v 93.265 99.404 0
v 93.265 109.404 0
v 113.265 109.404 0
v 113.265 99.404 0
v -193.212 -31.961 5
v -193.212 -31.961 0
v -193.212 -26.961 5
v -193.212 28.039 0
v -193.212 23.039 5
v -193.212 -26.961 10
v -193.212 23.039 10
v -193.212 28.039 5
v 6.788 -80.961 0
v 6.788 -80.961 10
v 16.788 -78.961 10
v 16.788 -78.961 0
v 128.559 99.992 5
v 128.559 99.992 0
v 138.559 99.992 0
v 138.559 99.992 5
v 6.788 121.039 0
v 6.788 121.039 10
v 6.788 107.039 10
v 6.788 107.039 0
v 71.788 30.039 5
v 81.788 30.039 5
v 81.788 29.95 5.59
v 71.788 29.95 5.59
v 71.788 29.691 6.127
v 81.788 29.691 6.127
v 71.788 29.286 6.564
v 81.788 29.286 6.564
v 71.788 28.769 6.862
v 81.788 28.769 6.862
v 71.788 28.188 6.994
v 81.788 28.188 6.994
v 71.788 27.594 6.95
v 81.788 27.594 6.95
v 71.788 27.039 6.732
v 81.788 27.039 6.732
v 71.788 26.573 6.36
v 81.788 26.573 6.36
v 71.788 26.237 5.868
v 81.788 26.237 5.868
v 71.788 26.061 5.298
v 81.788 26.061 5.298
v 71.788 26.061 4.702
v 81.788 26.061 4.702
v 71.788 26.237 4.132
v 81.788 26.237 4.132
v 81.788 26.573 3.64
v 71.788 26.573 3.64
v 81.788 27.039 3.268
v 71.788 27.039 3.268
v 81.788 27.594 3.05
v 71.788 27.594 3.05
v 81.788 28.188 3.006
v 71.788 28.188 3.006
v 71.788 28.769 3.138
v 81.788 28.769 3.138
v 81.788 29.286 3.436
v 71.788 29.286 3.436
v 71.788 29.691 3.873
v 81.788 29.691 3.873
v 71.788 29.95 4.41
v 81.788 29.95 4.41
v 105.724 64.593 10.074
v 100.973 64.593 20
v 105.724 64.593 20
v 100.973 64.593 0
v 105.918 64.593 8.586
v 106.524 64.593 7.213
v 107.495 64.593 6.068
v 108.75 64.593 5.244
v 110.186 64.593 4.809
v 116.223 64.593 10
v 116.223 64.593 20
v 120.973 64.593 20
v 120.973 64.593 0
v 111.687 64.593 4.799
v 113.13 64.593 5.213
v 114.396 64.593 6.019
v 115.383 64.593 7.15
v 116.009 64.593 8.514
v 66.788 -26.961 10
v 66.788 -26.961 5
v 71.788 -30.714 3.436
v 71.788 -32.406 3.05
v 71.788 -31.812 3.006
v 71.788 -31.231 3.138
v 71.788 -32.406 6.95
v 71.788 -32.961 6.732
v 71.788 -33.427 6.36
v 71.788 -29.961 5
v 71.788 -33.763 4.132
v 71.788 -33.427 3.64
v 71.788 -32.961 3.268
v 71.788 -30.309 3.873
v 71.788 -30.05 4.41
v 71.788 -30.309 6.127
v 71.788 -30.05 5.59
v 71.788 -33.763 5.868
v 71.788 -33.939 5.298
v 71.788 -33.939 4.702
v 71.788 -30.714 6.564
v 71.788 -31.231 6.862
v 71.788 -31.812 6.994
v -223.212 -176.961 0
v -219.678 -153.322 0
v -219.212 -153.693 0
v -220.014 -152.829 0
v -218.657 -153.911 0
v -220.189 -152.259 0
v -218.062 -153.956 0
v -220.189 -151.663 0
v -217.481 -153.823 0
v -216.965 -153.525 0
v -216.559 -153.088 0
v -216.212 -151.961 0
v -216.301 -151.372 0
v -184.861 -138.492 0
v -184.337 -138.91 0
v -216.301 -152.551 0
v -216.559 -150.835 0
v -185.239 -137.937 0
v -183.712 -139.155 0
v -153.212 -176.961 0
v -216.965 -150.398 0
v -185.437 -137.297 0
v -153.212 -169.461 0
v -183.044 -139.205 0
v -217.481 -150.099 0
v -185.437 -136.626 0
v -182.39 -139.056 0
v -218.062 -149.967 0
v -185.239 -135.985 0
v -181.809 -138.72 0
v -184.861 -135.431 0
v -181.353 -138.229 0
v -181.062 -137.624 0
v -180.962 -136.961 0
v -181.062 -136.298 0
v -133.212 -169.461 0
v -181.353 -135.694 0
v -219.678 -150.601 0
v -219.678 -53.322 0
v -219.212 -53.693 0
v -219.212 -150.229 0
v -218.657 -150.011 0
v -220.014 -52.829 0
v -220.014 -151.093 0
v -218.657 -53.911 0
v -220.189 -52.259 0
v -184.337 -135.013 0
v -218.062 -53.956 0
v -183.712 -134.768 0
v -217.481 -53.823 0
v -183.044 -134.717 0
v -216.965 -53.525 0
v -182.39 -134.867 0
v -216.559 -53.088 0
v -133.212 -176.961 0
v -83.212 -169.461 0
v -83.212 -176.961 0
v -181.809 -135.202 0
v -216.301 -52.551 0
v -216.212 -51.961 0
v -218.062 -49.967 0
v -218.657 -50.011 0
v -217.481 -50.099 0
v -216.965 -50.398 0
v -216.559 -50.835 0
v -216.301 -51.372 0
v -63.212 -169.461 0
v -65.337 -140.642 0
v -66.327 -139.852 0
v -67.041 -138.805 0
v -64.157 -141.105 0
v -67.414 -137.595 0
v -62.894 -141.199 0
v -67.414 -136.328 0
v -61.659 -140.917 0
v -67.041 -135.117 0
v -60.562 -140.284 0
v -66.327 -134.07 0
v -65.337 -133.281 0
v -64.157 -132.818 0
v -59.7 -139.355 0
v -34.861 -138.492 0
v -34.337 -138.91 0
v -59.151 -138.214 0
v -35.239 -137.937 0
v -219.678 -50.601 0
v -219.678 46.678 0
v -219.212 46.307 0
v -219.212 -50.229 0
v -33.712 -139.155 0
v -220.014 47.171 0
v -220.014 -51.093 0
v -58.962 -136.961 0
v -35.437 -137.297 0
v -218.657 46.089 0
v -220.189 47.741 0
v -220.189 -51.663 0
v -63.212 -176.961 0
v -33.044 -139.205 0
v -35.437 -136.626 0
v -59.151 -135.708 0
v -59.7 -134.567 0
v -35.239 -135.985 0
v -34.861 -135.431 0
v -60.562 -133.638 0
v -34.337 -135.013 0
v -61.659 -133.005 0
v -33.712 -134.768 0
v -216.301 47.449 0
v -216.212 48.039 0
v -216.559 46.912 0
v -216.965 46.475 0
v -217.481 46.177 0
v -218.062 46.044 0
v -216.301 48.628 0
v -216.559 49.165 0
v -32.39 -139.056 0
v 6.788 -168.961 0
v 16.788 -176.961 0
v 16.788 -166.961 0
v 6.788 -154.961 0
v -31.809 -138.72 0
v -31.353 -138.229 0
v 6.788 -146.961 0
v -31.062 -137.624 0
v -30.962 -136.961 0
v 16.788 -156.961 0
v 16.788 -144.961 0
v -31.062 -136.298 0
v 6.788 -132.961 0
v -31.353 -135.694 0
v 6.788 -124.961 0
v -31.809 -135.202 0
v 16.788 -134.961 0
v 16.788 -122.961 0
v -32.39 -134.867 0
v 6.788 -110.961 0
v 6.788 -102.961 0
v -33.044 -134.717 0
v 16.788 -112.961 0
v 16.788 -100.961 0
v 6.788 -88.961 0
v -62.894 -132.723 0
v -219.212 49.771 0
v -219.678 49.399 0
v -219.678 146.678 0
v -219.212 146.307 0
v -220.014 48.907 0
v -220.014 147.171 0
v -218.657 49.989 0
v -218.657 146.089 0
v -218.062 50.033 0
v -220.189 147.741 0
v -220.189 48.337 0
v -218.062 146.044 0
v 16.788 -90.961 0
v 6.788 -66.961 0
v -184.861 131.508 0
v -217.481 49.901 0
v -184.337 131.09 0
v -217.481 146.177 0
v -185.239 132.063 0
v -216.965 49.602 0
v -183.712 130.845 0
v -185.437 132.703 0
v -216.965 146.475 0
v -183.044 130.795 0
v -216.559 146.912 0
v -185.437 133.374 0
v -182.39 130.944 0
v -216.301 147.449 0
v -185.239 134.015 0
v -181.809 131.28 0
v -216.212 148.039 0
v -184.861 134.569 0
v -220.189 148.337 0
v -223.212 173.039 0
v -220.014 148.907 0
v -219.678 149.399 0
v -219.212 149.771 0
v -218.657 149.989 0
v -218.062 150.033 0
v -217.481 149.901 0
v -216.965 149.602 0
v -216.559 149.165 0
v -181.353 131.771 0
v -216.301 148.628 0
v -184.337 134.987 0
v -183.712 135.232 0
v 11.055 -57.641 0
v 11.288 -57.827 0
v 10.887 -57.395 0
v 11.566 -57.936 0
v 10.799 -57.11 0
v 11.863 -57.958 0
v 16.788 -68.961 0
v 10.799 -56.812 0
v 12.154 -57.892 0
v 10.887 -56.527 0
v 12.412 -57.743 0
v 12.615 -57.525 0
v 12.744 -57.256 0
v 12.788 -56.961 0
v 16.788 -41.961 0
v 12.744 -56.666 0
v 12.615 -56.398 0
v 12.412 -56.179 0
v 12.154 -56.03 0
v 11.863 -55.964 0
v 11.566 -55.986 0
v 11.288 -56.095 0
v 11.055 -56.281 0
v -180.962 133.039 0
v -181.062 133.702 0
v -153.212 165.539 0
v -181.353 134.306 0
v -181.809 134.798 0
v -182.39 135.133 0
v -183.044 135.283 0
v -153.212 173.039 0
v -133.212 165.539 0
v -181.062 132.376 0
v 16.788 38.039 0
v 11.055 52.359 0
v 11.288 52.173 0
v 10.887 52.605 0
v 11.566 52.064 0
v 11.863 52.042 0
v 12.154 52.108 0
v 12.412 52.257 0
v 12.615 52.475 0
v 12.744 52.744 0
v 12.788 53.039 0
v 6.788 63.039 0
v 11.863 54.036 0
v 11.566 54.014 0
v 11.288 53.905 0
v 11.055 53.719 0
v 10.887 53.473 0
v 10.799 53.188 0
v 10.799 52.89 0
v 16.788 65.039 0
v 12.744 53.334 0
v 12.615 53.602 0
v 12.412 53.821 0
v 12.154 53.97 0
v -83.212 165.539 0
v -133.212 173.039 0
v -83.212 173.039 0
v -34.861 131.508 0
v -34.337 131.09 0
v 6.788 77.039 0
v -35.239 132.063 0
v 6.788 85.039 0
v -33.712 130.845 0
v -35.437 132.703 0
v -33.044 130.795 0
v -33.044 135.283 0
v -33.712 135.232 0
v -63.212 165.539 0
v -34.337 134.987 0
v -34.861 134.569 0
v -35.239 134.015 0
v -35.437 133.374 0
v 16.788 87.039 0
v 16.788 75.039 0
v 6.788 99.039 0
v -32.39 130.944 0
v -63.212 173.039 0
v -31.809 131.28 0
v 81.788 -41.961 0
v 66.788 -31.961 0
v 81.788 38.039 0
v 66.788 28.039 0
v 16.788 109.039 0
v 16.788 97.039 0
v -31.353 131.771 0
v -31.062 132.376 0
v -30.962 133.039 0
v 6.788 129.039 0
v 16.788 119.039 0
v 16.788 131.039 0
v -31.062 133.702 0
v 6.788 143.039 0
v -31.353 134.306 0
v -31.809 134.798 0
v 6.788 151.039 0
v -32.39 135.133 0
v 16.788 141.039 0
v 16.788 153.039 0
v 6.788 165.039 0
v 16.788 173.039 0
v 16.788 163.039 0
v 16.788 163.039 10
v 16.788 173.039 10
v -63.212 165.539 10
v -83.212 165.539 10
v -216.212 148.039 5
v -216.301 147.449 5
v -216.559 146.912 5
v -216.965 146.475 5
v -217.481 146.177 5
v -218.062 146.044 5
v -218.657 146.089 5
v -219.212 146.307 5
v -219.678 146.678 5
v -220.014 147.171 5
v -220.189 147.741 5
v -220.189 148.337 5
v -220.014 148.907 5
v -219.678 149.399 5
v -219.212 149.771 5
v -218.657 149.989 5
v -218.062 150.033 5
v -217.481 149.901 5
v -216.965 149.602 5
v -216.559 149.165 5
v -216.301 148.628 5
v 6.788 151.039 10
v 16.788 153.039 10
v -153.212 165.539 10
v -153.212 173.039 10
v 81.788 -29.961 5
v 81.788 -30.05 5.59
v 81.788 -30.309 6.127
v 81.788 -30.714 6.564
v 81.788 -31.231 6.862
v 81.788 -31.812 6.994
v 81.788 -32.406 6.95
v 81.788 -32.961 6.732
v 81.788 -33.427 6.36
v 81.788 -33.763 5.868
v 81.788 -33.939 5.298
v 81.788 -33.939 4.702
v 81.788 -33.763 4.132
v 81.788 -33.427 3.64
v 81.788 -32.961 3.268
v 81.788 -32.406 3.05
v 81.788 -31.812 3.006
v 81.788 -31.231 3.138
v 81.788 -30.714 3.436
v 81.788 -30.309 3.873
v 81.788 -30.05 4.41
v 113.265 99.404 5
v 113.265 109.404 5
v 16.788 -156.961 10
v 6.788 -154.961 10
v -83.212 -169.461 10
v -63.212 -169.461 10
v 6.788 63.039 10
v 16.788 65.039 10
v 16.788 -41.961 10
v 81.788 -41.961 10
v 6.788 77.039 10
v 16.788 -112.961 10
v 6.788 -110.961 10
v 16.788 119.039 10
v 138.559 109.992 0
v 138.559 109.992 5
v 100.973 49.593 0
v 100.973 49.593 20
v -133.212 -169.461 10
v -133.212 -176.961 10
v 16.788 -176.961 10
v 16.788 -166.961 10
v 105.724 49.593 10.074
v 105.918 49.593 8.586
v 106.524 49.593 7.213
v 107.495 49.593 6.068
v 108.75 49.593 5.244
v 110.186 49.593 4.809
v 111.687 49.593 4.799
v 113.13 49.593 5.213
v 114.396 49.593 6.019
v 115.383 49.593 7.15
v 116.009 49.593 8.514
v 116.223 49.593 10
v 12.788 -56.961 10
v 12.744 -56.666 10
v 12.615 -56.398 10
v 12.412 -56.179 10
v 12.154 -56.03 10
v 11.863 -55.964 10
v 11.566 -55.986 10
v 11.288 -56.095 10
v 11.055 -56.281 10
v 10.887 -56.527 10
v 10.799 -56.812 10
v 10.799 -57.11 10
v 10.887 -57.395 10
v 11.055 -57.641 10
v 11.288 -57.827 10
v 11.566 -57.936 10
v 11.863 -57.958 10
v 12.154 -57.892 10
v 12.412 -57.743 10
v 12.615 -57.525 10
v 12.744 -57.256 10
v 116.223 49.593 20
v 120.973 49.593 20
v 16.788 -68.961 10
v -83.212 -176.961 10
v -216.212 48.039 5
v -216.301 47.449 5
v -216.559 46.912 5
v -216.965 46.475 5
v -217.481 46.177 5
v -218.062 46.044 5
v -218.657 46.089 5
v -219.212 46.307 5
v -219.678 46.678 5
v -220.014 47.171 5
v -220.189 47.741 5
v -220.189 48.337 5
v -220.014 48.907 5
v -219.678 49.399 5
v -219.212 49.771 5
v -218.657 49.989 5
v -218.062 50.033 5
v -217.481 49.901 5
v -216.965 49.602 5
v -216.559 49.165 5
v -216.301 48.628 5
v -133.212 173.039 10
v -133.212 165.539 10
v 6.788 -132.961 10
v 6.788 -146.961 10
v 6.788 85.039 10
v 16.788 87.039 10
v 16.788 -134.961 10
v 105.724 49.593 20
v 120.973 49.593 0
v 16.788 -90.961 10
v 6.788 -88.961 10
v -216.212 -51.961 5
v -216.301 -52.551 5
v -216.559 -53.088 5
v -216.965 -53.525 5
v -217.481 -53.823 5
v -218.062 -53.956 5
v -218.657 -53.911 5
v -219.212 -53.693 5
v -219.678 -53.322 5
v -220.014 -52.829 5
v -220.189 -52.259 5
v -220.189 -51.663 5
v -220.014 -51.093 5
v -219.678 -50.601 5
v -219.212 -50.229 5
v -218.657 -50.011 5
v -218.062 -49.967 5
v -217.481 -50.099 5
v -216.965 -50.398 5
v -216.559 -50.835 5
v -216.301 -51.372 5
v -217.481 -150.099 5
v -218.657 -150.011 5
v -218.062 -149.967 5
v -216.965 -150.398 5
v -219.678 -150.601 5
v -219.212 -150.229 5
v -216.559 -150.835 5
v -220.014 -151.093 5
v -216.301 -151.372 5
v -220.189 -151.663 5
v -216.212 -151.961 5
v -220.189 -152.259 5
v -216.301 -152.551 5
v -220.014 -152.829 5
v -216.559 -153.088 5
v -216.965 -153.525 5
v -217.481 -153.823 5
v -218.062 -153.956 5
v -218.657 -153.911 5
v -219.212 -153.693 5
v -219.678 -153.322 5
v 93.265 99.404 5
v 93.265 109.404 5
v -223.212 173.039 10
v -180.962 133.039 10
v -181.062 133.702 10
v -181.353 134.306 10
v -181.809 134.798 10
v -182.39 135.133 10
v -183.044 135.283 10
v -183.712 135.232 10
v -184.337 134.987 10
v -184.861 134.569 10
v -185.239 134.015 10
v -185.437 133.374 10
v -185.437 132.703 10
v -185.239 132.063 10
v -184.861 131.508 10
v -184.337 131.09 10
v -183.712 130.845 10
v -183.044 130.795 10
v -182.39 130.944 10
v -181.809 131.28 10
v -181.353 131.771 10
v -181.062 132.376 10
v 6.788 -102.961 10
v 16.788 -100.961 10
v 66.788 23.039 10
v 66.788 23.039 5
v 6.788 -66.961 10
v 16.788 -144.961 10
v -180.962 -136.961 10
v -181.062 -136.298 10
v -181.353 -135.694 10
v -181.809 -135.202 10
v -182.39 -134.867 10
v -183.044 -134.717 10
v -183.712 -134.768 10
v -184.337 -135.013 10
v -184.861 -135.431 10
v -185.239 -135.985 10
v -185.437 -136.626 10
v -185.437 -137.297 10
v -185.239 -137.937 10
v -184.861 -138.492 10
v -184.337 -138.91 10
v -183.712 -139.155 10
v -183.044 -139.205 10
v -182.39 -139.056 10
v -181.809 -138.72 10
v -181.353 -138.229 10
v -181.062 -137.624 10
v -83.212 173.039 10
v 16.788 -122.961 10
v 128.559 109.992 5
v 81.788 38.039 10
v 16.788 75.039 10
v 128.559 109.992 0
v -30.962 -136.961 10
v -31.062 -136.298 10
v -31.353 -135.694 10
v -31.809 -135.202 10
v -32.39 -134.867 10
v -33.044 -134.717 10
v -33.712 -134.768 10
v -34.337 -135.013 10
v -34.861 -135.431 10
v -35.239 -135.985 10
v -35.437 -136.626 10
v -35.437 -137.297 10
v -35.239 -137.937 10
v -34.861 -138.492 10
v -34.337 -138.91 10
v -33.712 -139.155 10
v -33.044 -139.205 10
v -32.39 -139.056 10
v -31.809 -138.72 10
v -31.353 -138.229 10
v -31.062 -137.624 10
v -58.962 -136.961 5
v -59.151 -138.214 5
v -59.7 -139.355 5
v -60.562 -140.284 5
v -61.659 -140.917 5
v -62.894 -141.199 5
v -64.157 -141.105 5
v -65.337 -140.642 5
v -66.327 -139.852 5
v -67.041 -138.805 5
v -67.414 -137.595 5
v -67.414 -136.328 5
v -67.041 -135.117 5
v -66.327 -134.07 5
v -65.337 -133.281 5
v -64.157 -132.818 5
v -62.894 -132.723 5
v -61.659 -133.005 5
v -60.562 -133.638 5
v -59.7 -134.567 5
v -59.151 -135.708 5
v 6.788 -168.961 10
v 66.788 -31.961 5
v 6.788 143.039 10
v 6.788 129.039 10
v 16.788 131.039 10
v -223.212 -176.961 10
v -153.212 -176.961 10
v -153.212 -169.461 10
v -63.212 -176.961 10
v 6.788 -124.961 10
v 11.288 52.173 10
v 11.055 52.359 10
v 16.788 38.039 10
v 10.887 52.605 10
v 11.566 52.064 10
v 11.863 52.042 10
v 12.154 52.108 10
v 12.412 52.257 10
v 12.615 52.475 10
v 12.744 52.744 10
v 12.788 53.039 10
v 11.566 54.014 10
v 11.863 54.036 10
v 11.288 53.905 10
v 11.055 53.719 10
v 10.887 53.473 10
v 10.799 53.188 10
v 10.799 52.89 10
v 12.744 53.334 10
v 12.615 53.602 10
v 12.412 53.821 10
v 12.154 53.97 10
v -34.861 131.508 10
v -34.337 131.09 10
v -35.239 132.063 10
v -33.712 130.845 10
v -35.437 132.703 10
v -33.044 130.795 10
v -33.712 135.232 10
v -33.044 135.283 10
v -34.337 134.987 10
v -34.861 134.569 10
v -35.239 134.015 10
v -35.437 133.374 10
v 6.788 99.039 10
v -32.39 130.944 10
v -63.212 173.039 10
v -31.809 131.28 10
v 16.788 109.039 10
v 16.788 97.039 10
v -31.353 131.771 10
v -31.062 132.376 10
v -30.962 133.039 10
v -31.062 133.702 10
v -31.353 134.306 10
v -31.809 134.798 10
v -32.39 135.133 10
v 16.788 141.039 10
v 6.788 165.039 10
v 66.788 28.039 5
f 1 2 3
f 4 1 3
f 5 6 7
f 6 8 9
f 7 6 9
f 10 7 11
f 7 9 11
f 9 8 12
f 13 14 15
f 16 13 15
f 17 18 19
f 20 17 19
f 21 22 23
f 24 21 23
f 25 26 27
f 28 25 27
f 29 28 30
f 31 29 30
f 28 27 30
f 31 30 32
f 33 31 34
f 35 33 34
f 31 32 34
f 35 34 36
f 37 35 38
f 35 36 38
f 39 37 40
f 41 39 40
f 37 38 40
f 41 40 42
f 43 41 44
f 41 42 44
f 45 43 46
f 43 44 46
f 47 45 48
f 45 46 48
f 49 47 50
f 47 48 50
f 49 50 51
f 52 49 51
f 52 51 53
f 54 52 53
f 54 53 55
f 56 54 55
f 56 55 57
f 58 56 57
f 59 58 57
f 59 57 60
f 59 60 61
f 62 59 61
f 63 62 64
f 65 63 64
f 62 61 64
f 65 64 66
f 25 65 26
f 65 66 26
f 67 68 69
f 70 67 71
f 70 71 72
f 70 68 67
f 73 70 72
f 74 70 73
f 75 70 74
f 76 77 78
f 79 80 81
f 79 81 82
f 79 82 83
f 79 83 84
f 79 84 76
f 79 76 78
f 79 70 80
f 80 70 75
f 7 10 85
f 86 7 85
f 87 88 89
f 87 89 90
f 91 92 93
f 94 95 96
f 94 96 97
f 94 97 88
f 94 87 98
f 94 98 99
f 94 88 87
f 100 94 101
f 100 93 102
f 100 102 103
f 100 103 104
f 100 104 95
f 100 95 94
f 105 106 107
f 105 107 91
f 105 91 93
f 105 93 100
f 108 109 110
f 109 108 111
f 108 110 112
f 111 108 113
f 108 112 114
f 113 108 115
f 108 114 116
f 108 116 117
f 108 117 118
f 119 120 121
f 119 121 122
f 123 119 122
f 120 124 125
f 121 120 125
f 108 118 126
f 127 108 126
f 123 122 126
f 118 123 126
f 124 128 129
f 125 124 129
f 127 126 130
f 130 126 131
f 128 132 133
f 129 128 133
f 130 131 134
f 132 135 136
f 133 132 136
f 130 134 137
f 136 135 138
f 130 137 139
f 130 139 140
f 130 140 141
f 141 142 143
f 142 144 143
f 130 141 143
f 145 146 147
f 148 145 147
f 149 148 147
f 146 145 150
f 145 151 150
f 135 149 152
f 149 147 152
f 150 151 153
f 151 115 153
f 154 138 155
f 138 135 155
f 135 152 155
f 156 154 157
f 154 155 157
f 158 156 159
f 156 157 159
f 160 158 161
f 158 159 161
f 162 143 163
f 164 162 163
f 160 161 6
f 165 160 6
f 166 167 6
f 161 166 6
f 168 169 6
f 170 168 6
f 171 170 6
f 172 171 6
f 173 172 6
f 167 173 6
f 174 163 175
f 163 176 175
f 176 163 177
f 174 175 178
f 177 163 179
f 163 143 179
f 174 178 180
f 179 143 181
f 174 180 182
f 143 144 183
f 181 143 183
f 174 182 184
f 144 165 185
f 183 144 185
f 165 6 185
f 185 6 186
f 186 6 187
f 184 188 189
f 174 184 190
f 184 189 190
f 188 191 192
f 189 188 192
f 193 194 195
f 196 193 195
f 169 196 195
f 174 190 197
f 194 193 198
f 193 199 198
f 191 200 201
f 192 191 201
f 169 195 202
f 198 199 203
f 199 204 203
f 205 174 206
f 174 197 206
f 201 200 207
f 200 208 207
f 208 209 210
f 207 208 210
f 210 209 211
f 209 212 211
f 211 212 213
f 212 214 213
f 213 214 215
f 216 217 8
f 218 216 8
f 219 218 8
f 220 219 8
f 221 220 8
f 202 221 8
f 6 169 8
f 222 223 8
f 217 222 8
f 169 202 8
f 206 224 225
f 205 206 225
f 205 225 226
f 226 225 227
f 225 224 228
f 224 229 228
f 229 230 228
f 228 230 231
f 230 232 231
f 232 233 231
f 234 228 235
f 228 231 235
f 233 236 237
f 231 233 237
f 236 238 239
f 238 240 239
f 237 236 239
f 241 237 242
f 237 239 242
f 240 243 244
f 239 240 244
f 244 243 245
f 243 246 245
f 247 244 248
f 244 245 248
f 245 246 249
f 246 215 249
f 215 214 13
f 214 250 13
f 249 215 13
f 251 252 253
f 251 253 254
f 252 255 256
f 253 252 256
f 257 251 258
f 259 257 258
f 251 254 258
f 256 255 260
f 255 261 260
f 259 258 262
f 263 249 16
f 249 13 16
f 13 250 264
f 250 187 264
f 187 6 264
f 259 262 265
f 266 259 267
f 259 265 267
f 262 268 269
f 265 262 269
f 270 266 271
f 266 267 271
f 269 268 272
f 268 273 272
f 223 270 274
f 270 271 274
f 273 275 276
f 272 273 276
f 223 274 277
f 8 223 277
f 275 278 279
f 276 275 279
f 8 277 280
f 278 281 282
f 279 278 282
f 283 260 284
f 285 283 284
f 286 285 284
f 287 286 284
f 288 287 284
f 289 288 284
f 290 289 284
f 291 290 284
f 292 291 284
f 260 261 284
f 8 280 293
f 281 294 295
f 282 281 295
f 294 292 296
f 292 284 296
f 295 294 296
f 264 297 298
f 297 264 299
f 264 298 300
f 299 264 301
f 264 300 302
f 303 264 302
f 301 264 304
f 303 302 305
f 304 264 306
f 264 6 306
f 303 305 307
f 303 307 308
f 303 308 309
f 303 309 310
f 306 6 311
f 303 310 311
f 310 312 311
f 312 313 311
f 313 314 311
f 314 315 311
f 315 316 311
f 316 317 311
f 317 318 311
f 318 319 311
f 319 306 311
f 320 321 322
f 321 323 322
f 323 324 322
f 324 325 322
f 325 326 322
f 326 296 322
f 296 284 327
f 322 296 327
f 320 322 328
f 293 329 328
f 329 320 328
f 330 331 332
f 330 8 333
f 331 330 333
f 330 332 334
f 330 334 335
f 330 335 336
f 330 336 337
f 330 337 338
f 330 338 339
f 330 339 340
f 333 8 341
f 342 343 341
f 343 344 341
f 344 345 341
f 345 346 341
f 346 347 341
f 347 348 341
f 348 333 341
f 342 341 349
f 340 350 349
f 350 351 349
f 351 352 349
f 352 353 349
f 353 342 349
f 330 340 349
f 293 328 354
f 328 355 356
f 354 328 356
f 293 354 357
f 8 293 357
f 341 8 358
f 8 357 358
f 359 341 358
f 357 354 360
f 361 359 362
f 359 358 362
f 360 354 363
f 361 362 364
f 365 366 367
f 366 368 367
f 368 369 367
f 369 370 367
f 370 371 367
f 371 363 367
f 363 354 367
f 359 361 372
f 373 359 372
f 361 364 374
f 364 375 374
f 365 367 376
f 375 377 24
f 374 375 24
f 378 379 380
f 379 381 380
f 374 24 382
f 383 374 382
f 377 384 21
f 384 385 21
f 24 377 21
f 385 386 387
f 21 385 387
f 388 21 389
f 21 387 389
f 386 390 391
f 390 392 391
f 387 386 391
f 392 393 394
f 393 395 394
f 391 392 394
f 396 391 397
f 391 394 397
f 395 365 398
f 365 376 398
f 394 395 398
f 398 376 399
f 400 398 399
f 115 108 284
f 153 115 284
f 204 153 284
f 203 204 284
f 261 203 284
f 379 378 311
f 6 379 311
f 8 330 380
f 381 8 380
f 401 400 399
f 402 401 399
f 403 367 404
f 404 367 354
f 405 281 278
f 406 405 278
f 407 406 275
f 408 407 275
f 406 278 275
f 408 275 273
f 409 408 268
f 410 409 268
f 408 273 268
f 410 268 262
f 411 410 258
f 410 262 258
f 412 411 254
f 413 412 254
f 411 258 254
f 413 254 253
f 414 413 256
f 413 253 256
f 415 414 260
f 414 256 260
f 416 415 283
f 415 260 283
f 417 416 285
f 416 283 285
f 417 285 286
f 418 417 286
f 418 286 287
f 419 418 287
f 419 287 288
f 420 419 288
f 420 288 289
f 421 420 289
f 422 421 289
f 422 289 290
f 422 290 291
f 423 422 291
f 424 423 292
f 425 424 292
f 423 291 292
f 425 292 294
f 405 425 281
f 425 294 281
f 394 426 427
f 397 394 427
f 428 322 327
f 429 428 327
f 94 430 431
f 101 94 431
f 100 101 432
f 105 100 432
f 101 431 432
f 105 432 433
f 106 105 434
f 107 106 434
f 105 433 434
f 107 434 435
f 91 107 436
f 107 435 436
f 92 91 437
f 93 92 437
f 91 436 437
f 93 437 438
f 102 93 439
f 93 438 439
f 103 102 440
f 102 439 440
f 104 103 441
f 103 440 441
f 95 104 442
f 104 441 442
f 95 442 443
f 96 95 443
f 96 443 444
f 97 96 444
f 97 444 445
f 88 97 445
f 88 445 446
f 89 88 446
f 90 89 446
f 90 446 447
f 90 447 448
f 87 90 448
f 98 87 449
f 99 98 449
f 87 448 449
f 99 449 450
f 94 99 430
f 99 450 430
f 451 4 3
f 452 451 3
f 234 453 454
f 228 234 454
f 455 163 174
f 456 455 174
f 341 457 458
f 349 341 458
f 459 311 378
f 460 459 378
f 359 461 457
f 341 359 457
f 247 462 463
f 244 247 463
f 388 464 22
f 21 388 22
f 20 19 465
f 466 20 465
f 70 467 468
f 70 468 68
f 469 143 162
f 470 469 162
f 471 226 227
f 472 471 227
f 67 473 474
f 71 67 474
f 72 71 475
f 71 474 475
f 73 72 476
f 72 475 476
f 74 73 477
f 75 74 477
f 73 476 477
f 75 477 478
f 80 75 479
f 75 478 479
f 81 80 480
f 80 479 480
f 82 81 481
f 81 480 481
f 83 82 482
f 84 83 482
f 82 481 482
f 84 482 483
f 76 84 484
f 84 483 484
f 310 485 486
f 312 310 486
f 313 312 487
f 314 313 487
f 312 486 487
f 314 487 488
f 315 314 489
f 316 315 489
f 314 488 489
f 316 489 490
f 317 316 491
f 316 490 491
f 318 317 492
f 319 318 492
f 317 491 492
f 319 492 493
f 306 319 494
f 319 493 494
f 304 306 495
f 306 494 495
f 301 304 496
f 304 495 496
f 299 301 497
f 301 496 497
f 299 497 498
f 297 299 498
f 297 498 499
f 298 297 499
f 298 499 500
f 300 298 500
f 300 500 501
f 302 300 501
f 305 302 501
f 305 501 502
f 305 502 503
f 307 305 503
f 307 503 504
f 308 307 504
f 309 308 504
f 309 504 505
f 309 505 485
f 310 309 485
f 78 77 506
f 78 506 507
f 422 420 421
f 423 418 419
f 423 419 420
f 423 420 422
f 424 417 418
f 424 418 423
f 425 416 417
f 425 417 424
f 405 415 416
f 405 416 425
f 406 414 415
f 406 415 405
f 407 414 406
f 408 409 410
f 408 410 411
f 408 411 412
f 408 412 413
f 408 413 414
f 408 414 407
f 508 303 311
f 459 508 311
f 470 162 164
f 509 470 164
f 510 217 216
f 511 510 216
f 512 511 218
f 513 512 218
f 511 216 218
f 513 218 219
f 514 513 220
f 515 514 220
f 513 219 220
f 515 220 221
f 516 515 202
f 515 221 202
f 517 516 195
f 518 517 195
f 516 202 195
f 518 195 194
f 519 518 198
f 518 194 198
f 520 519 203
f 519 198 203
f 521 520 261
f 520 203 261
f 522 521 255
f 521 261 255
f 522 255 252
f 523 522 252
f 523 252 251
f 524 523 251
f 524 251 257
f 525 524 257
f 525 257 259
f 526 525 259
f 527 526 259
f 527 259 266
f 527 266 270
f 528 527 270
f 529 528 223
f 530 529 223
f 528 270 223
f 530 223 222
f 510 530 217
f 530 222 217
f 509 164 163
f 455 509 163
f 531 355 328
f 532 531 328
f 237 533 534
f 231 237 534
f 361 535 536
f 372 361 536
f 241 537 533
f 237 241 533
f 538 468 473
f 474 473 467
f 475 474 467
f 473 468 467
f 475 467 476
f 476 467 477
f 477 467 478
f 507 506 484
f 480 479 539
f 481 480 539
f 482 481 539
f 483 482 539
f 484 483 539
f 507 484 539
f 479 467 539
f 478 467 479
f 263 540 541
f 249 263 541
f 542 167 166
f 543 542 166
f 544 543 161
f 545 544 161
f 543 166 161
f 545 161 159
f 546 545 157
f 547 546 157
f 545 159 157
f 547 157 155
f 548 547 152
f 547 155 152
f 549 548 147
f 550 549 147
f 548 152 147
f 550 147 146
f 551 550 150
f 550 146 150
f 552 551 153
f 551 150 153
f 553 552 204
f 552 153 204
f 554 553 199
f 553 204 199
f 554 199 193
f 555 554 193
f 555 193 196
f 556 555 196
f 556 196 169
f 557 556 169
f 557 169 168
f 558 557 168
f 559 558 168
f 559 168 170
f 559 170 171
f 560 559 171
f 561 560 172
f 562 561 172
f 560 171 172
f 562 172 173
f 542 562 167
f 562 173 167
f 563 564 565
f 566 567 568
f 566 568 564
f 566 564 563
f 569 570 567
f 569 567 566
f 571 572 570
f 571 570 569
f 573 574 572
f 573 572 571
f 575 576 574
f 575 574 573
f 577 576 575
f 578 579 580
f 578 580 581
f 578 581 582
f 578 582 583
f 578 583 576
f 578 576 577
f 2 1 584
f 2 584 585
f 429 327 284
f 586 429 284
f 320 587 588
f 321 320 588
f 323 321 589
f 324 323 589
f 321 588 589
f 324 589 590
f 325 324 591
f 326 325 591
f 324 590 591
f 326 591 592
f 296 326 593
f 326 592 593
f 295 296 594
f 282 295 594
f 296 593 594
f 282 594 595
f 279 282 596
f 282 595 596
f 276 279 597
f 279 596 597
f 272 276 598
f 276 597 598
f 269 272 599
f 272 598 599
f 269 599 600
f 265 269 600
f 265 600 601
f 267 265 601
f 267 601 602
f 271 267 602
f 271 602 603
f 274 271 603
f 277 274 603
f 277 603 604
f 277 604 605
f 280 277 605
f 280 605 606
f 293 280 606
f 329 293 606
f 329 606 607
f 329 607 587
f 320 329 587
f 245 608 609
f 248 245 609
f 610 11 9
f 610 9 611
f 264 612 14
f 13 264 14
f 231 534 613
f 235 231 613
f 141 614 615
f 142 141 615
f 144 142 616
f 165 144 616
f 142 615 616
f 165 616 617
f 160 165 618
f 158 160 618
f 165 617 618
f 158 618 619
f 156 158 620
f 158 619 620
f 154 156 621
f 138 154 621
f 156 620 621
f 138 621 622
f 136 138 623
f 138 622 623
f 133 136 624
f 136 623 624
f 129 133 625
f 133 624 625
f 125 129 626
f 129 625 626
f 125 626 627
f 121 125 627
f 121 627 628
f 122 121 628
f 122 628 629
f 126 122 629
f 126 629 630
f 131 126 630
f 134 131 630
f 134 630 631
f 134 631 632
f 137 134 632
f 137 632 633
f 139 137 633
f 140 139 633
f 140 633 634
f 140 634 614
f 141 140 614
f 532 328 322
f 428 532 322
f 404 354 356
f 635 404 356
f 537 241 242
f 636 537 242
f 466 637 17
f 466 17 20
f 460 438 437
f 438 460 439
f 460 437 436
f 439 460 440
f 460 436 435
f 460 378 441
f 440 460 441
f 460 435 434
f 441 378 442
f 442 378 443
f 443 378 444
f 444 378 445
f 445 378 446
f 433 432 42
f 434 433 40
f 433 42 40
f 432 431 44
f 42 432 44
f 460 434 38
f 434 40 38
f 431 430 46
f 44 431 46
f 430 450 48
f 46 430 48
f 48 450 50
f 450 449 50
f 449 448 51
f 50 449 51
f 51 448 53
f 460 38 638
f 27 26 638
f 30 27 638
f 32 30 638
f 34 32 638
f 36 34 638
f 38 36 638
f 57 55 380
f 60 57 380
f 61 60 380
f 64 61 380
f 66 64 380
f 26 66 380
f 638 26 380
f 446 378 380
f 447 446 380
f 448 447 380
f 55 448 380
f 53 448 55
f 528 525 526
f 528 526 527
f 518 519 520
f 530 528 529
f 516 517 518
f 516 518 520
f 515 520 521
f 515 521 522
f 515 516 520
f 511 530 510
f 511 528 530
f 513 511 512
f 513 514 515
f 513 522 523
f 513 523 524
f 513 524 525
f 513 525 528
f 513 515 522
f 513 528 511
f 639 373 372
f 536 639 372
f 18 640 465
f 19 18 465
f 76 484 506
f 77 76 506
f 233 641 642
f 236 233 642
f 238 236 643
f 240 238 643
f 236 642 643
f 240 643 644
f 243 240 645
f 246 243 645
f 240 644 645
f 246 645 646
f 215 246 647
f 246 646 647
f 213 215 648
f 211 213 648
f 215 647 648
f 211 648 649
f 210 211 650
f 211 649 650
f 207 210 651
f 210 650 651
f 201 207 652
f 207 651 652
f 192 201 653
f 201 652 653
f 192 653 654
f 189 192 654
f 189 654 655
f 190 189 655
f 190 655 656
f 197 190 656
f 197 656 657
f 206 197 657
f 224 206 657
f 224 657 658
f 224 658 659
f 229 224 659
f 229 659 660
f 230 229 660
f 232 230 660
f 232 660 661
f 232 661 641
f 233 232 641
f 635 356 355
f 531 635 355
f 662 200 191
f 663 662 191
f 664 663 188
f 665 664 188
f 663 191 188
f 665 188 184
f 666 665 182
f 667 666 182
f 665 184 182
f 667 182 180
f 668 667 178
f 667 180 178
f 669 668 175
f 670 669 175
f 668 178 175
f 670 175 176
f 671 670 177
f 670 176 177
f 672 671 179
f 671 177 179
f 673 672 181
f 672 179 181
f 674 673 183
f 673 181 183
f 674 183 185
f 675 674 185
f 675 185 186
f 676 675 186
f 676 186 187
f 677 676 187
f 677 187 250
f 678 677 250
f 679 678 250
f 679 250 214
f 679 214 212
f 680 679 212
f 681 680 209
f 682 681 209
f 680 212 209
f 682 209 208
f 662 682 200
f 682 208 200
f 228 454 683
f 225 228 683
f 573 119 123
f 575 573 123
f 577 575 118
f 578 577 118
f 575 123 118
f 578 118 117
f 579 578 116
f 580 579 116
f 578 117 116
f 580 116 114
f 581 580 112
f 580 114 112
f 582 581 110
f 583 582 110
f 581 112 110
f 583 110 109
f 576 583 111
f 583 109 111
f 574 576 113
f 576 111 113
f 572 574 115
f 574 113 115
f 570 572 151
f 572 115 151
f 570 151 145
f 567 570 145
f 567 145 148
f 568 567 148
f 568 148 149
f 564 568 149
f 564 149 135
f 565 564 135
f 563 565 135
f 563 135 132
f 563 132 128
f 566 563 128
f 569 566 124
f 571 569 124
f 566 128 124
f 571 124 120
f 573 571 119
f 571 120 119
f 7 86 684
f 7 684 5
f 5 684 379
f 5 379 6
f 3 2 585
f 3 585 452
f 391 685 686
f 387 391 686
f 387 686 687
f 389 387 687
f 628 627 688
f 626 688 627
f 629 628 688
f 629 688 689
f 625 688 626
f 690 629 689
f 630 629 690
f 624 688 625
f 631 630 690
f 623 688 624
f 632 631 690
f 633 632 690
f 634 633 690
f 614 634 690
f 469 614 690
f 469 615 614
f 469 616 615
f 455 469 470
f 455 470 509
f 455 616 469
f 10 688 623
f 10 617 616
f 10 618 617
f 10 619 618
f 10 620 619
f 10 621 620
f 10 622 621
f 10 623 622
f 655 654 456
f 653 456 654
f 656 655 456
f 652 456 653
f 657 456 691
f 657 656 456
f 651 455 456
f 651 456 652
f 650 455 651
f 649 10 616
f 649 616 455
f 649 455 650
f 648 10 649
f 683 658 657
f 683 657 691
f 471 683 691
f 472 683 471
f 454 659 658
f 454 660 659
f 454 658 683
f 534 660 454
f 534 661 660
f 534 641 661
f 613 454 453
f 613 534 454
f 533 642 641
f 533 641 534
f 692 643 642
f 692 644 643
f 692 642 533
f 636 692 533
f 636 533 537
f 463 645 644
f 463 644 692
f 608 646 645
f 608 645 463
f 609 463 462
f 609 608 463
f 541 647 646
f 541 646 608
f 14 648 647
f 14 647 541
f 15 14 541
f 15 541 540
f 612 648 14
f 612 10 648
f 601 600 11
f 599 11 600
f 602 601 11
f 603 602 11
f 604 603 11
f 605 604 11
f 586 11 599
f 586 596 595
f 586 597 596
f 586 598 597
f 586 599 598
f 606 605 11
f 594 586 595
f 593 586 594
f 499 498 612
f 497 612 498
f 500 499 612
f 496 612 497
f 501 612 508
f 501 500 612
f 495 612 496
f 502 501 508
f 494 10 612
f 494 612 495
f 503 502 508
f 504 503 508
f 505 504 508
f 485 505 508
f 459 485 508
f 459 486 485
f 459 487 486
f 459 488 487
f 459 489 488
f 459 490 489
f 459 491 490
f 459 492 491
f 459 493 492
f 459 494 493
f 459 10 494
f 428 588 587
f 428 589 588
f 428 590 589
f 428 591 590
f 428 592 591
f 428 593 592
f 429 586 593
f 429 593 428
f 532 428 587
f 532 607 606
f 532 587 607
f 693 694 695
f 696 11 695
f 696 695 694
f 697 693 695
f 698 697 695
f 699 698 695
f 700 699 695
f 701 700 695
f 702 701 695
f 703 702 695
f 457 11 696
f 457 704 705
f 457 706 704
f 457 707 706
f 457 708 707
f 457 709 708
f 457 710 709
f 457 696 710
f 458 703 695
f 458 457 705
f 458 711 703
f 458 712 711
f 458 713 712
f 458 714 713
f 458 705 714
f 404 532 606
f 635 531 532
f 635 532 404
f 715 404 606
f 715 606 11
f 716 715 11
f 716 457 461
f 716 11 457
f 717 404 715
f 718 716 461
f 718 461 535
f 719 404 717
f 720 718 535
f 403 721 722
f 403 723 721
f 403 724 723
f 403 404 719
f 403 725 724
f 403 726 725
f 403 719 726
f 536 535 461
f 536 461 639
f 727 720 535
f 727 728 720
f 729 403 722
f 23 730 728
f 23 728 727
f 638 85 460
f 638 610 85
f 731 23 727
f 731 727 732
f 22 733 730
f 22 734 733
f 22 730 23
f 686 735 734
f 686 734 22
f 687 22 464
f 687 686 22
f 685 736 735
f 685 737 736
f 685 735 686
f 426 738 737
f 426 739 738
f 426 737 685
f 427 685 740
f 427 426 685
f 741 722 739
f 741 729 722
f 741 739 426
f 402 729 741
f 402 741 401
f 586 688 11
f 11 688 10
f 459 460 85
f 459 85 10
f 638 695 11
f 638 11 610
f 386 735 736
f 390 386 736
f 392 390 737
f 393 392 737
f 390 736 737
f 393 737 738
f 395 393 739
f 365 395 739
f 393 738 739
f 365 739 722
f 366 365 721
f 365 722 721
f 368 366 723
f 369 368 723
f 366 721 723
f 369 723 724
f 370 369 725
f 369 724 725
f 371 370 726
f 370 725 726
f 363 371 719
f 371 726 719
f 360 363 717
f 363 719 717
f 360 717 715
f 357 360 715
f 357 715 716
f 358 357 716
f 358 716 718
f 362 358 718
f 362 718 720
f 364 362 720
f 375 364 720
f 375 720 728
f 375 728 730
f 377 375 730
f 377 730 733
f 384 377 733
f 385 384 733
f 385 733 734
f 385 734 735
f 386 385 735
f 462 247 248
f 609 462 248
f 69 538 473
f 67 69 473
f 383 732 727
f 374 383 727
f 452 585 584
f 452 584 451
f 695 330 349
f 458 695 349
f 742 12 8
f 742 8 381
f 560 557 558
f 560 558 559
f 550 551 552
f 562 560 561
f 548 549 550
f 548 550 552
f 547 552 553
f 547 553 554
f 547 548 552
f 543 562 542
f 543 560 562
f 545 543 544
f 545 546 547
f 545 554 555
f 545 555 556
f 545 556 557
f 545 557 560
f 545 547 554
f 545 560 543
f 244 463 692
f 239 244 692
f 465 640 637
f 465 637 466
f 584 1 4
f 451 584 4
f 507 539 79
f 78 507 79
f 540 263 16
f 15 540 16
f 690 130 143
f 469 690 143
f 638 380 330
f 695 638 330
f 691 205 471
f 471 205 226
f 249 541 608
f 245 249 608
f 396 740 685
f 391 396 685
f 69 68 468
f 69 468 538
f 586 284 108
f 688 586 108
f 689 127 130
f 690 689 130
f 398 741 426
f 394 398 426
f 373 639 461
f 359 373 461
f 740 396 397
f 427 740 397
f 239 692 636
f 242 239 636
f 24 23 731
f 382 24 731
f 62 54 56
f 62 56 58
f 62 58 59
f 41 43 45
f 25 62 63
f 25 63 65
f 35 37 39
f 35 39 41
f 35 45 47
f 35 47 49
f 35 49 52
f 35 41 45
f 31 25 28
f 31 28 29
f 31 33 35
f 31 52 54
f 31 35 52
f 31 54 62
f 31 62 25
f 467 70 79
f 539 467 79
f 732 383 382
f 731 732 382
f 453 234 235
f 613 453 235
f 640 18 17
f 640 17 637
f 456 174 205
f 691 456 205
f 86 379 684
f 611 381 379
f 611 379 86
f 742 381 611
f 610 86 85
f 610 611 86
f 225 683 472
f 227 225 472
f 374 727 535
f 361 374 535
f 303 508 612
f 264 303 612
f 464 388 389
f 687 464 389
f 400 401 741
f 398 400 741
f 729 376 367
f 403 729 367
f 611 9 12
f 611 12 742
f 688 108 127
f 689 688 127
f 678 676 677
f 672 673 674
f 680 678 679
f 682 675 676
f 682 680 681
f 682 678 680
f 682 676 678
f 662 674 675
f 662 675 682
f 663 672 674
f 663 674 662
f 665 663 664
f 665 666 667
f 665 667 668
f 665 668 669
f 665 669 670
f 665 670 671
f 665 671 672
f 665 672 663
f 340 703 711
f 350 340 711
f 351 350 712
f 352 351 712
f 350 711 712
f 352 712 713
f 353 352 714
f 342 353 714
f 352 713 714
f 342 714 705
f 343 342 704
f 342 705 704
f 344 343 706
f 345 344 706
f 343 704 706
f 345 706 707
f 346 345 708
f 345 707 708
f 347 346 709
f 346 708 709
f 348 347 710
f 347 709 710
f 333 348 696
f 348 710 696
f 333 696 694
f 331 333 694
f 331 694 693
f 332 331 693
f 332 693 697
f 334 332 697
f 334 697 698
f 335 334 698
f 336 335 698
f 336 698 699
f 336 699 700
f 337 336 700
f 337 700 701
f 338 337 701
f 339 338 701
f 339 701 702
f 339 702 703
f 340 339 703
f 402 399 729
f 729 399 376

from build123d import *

# Parameters (mm, degrees)
F1_DEPTH  = 10
F2_W      = 260
F2_H      = 50
F3_DEPTH  = 10.001
F4_W      = 260
F4_H      = 5
F5_DEPTH  = 5
F6_W      = 260
F6_H      = 5
F7_DEPTH  = 5
F8_R      = 2.25
F9_DEPTH  = 10.001
F10_R     = 4.25
F10_R_2   = 2
F11_DEPTH = 5
F12_R     = 1
F13_DEPTH = 10.001
F14_W     = 20
F14_H     = 10
F15_DEPTH = 5
F14_W_2   = 10
F16_W     = 20
F16_H     = 15
F17_DEPTH = 20
F19_DEPTH = 123.4470965771
F20_R     = 2
F21_DEPTH = 10
F23_DEPTH = 10.001


with BuildPart() as f1:
    # F0 (on Top) → F1 (new body)
    with BuildSketch(Plane.XY):
        Polygon((-153.2117038436, 173.0387948453), (-223.2117038436, 173.0387948453), (-223.2117038436, -176.9612051547), (-153.2117038436, -176.9612051547), (-153.2117038436, -169.4612051547), (-133.2117038436, -169.4612051547), (-133.2117038436, -176.9612051547), (-83.2117038436, -176.9612051547), (-83.2117038436, -169.4612051547), (-63.2117038436, -169.4612051547), (-63.2117038436, -176.9612051547), (16.7882961564, -176.9612051547), (16.7882961564, -41.9612051547), (81.7882961564, -41.9612051547), (81.7882961564, 38.0387948453), (16.7882961564, 38.0387948453), (16.7882961564, 173.0387948453), (-63.2117038436, 173.0387948453), (-63.2117038436, 165.5387948453), (-83.2117038436, 165.5387948453), (-83.2117038436, 173.0387948453), (-133.2117038436, 173.0387948453), (-133.2117038436, 165.5387948453), (-153.2117038436, 165.5387948453), align=None)
    extrude(amount=F1_DEPTH)

    # F2 (on face) → F3 (cut, through all)
    with BuildSketch(Plane.XY.offset(10)):
        with Locations((-63.2117038436, -1.9612051547)):
            Rectangle(F2_W, F2_H)
    extrude(amount=-F3_DEPTH, mode=Mode.SUBTRACT)

    # F4 (on face) → F5 (cut)
    with BuildSketch(Plane.XZ.offset(-23.0387948453)):
        with Locations((-63.2117038436, 2.5)):
            Rectangle(F4_W, F4_H)
    extrude(amount=-F5_DEPTH, mode=Mode.SUBTRACT)

    # F6 (on face) → F7 (cut)
    with BuildSketch(Plane(origin=(0, -26.9612051547, 0), x_dir=(-1, 0, 0), z_dir=(0, 1, 0))):
        with Locations((63.2117038436, 2.5)):
            Rectangle(F6_W, F6_H)
    extrude(amount=-F7_DEPTH, mode=Mode.SUBTRACT)

    # F8 (on face) → F9 (cut, through all)
    with BuildSketch(Plane.XY.offset(10)):
        with Locations((-183.2117038436, 133.0387948453)):
            Circle(F8_R)
        with Locations((-33.2117038436, 133.0387948453)):
            Circle(F8_R)
        with Locations((-183.2117038436, -136.9612051547)):
            Circle(F8_R)
        with Locations((-33.2117038436, -136.9612051547)):
            Circle(F8_R)
    extrude(amount=-F9_DEPTH, mode=Mode.SUBTRACT)

    # F10 (on face) → F11 (cut)
    with BuildSketch(Plane(origin=(0, 0, 0), x_dir=(1, 0, 0), z_dir=(0, 0, -1))):
        with Locations((-63.2117038436, 136.9612051547)):
            Circle(F10_R)
        with Locations((-218.2117038436, 151.9612051547)):
            Circle(F10_R_2)
        with Locations((-218.2117038436, 51.9612051547)):
            Circle(F10_R_2)
        with Locations((-218.2117038436, -48.0387948453)):
            Circle(F10_R_2)
        with Locations((-218.2117038436, -148.0387948453)):
            Circle(F10_R_2)
    extrude(amount=-F11_DEPTH, mode=Mode.SUBTRACT)

    # F12 (on face) → F13 (cut, through all)
    with BuildSketch(Plane.XY.offset(10)):
        with Locations((11.7882961564, -56.9612051547)):
            Circle(F12_R)
        with Locations((11.7882961564, 53.0387948453)):
            Circle(F12_R)
    extrude(amount=-F13_DEPTH, mode=Mode.SUBTRACT)

    # F20 (on face) → F21 (cut)
    with BuildSketch(Plane.YZ.offset(81.7882961564)):
        with Locations((-31.9612051547, 5)):
            Circle(F20_R)
        with Locations((28.0387948453, 5)):
            Circle(F20_R)
    extrude(amount=-F21_DEPTH, mode=Mode.SUBTRACT)

    # F22 (on face) → F23 (cut, through all)
    with BuildSketch(Plane.XY.offset(10)):
        Polygon((6.7882961564, -168.9612051547), (16.7882961564, -166.9612051547), (16.7882961564, -156.9612051547), (6.7882961564, -154.9612051547), align=None)
        Polygon((16.7882961564, 153.0387948453), (16.7882961564, 163.0387948453), (6.7882961564, 165.0387948453), (6.7882961564, 151.0387948453), align=None)
        Polygon((6.7882961564, 143.0387948453), (6.7882961564, 129.0387948453), (16.7882961564, 131.0387948453), (16.7882961564, 141.0387948453), align=None)
        Polygon((6.7882961564, 121.0387948453), (6.7882961564, 107.0387948453), (16.7882961564, 109.0387948453), (16.7882961564, 119.0387948453), align=None)
        Polygon((6.7882961564, 99.0387948453), (6.7882961564, 85.0387948453), (16.7882961564, 87.0387948453), (16.7882961564, 97.0387948453), align=None)
        Polygon((6.7882961564, -146.9612051547), (16.7882961564, -144.9612051547), (16.7882961564, -134.9612051547), (6.7882961564, -132.9612051547), align=None)
        Polygon((6.7882961564, -124.9612051547), (16.7882961564, -122.9612051547), (16.7882961564, -112.9612051547), (6.7882961564, -110.9612051547), align=None)
        Polygon((6.7882961564, -102.9612051547), (16.7882961564, -100.9612051547), (16.7882961564, -90.9612051547), (6.7882961564, -88.9612051547), align=None)
        Polygon((6.7882961564, 77.0387948453), (6.7882961564, 63.0387948453), (16.7882961564, 65.0387948453), (16.7882961564, 75.0387948453), align=None)
        Polygon((6.7882961564, -80.9612051547), (16.7882961564, -78.9612051547), (16.7882961564, -68.9612051547), (6.7882961564, -66.9612051547), align=None)
    extrude(amount=-F23_DEPTH, mode=Mode.SUBTRACT)


with BuildPart() as f15:
    # F14 (on Top) → F15 (new body)
    with BuildSketch(Plane.XY):
        with Locations((103.2652358298, 104.4041585319)):
            Rectangle(F14_W, F14_H)
    extrude(amount=F15_DEPTH)


with BuildPart() as f15b:
    # F14 (on Top) → F15, piece 2 (new body)
    with BuildSketch(Plane.XY):
        with Locations((133.5593304069, 104.9923974879)):
            Rectangle(F14_W_2, F14_H)
    extrude(amount=F15_DEPTH)


with BuildPart() as f17:
    # F16 (on Top) → F17 (new body)
    with BuildSketch(Plane.XY):
        with Locations((110.9734810889, 57.0926982683)):
            Rectangle(F16_W, F16_H)
    extrude(amount=F17_DEPTH)

    # F18 (on face) → F19 (cut, through all)
    with BuildSketch(Plane.XZ.offset(-49.5926982683)):
        with BuildLine():
            Line((105.7240052134, 20), (105.7240052134, 10.0741824286))
            ThreePointArc((105.7240052134, 10.0741824286), (110.9363889488, 4.7501310328), (116.2234810889, 10))
            Line((116.2234810889, 10), (116.2234810889, 20))
            Line((116.2234810889, 20), (105.7240052134, 20))
        make_face()
    extrude(amount=-F19_DEPTH, mode=Mode.SUBTRACT)


solid = Compound([f1.part, f15.part, f15b.part, f17.part])
